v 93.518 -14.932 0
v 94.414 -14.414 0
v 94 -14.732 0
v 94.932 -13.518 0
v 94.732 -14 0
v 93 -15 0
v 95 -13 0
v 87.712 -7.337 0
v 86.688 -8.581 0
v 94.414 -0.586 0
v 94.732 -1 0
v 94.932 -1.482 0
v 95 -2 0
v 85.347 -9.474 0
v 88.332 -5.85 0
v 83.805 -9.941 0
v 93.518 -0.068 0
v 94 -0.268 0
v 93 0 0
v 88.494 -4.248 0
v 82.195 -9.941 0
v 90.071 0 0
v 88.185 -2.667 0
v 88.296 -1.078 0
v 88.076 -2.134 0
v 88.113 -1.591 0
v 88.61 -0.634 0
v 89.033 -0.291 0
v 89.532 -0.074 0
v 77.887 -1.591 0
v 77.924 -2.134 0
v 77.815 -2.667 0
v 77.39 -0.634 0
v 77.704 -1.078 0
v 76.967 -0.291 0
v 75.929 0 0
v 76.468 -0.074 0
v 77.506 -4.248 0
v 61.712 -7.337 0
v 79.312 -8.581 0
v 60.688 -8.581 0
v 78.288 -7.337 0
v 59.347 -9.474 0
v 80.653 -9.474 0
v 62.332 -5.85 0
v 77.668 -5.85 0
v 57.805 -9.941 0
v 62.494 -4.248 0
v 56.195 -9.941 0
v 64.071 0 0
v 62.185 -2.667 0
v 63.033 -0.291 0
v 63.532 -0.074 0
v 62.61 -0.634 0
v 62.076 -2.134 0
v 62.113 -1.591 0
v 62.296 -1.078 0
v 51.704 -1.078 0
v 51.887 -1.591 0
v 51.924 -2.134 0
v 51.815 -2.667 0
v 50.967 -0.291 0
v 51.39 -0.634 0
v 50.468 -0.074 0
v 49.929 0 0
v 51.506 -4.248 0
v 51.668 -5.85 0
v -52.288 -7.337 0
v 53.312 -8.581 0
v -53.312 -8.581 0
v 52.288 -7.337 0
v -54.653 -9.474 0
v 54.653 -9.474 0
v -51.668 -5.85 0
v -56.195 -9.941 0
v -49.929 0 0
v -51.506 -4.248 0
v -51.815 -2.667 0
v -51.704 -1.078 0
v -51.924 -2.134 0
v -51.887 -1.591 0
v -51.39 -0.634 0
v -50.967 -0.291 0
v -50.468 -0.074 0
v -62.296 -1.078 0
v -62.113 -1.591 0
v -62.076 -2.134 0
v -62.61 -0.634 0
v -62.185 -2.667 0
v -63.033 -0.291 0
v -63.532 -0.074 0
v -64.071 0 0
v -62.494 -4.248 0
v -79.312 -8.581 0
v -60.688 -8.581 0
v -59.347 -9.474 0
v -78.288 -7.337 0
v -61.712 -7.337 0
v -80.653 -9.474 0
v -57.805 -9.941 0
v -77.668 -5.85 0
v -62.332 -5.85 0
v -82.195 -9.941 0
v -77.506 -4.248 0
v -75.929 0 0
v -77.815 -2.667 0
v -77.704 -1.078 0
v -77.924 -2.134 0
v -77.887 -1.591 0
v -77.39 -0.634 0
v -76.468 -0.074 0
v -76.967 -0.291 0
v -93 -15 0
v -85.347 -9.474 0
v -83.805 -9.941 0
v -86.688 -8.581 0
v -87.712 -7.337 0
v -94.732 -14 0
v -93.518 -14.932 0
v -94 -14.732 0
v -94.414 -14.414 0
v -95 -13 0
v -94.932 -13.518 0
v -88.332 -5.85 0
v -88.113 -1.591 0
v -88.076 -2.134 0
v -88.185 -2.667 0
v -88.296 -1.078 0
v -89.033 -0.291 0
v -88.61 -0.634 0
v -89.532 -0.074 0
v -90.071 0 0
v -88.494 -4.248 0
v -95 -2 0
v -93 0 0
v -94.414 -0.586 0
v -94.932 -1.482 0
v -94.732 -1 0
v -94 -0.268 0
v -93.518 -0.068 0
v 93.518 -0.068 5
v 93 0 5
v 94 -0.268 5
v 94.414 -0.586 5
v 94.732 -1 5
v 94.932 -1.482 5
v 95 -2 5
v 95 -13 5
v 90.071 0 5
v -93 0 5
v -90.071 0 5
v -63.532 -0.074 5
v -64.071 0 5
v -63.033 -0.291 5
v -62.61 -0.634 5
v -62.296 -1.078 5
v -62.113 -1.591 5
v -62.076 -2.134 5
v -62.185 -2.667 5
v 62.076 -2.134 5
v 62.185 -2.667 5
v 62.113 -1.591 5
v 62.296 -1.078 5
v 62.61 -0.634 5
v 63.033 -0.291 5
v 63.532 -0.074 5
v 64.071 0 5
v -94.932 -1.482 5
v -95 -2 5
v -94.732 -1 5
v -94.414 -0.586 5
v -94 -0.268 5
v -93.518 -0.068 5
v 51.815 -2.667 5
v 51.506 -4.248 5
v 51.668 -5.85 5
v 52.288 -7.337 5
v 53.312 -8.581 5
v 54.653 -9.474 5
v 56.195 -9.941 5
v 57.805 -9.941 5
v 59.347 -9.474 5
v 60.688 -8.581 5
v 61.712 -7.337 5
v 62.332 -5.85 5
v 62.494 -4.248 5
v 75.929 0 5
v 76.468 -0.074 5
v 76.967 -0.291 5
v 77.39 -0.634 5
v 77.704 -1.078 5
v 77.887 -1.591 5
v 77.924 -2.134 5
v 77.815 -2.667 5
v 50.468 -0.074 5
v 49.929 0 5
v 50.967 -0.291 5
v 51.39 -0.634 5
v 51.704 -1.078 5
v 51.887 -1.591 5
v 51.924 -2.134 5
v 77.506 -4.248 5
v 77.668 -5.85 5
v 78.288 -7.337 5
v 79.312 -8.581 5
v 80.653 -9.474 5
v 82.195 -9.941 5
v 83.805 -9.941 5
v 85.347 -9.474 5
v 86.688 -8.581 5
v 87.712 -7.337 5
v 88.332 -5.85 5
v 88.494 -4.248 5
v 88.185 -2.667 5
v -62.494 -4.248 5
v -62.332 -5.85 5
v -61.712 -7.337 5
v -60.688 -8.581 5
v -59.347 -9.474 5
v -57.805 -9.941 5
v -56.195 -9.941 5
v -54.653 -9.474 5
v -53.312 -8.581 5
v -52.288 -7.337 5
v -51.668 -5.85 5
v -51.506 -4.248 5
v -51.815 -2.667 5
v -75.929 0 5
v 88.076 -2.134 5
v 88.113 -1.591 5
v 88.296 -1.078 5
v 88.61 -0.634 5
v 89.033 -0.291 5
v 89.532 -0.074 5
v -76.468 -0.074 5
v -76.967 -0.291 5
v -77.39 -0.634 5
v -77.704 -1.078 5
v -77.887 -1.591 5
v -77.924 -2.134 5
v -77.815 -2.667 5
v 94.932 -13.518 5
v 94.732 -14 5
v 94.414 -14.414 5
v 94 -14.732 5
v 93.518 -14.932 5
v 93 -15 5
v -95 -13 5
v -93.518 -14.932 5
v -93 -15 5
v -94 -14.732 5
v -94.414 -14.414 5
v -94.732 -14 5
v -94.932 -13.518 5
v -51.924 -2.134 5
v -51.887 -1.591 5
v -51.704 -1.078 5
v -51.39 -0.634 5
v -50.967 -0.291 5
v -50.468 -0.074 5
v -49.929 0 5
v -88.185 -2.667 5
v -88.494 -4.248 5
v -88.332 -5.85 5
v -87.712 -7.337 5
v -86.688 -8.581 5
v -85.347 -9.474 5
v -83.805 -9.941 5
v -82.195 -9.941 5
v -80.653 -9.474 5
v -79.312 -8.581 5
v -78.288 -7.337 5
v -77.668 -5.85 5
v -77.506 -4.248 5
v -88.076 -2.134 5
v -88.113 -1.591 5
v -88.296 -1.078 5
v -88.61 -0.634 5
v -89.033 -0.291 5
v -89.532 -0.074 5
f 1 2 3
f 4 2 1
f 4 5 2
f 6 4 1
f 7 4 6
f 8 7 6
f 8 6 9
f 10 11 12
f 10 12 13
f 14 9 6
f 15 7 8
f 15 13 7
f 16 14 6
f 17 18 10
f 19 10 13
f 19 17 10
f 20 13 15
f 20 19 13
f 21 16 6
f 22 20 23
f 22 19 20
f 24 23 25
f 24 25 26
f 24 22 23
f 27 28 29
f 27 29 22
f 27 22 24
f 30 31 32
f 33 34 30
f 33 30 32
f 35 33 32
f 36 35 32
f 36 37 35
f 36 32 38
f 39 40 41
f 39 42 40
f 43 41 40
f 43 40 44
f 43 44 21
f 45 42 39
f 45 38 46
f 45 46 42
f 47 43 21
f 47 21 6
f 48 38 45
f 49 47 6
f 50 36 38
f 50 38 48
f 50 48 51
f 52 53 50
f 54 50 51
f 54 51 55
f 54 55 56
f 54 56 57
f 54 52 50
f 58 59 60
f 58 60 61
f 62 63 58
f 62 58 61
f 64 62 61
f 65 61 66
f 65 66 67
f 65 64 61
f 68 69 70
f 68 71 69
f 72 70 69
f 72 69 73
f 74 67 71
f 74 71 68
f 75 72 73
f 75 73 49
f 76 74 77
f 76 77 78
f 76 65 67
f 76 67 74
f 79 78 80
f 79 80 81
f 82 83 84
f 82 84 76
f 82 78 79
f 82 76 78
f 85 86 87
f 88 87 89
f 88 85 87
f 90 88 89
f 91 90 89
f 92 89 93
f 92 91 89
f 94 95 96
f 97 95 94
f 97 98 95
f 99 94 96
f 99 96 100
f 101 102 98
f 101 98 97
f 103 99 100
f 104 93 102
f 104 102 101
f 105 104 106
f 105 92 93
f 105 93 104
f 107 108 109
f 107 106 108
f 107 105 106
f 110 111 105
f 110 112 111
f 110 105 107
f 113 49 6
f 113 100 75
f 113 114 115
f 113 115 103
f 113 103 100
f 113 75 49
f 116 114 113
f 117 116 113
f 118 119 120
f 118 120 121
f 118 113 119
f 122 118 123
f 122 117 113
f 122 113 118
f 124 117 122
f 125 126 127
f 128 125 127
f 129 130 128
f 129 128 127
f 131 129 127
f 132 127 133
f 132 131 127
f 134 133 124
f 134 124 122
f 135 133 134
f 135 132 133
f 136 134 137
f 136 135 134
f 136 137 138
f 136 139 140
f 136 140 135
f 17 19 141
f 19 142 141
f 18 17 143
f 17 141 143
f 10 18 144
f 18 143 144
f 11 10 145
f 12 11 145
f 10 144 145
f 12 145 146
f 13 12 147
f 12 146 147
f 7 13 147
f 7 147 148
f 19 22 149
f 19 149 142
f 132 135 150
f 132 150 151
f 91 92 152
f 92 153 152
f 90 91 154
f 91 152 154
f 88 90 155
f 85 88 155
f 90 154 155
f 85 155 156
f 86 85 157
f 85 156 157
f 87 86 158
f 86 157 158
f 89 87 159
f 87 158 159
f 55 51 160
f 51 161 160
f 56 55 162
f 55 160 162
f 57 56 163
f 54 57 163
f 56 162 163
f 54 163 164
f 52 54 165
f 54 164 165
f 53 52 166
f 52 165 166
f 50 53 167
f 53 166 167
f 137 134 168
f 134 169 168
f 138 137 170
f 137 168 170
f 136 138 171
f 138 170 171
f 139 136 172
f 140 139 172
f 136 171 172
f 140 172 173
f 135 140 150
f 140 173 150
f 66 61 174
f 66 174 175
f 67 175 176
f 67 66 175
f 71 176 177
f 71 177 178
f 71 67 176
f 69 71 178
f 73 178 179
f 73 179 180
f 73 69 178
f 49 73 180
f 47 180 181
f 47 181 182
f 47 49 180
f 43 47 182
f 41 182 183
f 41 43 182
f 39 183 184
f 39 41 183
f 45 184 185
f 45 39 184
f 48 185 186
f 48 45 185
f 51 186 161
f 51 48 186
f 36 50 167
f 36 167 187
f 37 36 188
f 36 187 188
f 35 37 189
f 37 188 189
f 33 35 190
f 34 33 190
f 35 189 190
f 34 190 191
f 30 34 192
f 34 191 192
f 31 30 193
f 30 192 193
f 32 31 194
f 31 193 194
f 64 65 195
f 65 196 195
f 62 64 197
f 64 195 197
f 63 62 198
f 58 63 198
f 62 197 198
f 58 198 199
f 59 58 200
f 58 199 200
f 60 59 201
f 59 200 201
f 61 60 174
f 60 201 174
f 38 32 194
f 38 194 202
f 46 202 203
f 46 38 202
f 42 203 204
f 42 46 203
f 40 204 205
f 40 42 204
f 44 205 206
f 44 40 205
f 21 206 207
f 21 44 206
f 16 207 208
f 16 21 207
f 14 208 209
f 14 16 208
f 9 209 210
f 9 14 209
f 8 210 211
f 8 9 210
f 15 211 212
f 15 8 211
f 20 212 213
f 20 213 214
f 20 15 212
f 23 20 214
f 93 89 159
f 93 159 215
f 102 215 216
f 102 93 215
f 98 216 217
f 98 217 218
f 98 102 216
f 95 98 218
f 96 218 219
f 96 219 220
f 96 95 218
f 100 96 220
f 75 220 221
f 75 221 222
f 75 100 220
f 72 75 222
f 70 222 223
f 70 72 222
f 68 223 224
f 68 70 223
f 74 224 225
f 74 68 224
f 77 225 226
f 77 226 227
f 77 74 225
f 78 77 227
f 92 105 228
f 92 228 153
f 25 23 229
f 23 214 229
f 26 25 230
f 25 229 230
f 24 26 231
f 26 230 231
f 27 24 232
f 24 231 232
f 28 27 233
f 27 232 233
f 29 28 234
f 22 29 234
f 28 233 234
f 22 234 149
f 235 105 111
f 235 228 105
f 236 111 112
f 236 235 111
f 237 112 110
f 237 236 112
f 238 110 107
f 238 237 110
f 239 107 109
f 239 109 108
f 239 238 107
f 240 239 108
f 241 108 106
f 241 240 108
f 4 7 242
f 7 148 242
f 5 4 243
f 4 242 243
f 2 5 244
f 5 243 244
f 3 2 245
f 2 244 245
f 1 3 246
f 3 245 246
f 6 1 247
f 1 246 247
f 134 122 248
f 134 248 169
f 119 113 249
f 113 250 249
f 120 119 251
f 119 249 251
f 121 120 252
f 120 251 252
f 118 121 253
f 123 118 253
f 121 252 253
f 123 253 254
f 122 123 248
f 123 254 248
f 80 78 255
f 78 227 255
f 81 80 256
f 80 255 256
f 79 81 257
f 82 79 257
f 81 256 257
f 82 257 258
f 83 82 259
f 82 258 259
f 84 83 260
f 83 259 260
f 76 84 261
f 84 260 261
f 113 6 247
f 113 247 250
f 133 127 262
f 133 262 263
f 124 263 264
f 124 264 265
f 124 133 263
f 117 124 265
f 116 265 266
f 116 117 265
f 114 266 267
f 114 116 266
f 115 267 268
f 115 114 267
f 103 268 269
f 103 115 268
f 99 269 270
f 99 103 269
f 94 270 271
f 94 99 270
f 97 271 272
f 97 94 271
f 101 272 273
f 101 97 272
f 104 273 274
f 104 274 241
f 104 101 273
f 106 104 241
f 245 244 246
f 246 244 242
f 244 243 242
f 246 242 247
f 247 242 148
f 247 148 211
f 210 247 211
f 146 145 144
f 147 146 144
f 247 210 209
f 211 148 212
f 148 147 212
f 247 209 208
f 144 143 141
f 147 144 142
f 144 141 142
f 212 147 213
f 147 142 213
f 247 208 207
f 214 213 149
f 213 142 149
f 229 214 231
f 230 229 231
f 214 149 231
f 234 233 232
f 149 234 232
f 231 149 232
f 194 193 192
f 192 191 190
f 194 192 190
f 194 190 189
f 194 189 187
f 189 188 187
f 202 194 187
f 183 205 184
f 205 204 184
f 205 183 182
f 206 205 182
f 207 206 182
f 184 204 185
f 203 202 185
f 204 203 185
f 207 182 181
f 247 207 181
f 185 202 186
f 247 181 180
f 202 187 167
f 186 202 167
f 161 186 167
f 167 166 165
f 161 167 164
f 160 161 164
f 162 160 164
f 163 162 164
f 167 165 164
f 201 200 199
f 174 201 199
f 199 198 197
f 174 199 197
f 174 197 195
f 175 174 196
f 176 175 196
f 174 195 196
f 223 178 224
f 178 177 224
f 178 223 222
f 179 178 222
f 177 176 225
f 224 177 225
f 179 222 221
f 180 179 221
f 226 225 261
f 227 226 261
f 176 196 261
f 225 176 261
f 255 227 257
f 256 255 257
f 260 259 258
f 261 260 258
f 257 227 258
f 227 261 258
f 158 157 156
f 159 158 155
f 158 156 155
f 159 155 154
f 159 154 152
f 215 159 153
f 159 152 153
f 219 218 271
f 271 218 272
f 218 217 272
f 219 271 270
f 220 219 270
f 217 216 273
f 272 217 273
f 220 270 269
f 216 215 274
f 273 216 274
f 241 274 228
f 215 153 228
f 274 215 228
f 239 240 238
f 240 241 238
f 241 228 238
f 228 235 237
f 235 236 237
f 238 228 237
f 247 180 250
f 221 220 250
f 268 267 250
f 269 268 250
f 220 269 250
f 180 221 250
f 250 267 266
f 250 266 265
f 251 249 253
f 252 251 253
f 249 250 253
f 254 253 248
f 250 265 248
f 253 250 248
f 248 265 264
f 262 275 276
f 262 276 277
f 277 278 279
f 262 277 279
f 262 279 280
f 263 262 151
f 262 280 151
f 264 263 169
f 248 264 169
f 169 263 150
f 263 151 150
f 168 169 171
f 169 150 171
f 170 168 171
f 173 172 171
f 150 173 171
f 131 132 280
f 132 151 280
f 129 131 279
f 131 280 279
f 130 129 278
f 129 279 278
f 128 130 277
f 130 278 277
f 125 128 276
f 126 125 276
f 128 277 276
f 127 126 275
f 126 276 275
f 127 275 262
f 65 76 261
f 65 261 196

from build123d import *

# Parameters (mm, degrees)
BOSS_EXTRU_1_DEPTH = 5
CONG_1_R           = 2


with BuildPart() as part:
    # Esquisse1 → Boss.-Extru.1 (new body)
    with BuildSketch(Plane.XY):
        with BuildLine():
            Line((-79.83772234, 0), (-60.16227766, 0))
            ThreePointArc((-60.16227766, 0), (-57, -10), (-53.83772234, 0))
            Line((-53.83772234, 0), (53.83772234, 0))
            ThreePointArc((53.83772234, 0), (57, -10), (60.16227766, 0))
            Line((60.16227766, 0), (79.83772234, 0))
            ThreePointArc((79.83772234, 0), (83, -10), (86.16227766, 0))
            Line((86.16227766, 0), (95, 0))
            Line((95, 0), (95, -15))
            Line((95, -15), (-95, -15))
            Line((-95, -15), (-95, 0))
            Line((-95, 0), (-86.16227766, 0))
            ThreePointArc((-86.16227766, 0), (-83, -10), (-79.83772234, 0))
        make_face()
    extrude(amount=BOSS_EXTRU_1_DEPTH)

    # Congé1
    cong_1_edges = [part.edges().sort_by_distance(p)[0] for p in [
        (-86.16227766, 0, 2.5),
        (-79.83772234, 0, 2.5),
        (-60.16227766, 0, 2.5),
        (-53.83772234, 0, 2.5),
        (53.83772234, 0, 2.5),
        (60.16227766, 0, 2.5),
        (79.83772234, 0, 2.5),
        (86.16227766, 0, 2.5),
        (95, 0, 2.5),
        (95, -15, 2.5),
        (-95, -15, 2.5),
        (-95, 0, 2.5),
    ]]
    fillet(cong_1_edges, radius=CONG_1_R)


solid = part.part
